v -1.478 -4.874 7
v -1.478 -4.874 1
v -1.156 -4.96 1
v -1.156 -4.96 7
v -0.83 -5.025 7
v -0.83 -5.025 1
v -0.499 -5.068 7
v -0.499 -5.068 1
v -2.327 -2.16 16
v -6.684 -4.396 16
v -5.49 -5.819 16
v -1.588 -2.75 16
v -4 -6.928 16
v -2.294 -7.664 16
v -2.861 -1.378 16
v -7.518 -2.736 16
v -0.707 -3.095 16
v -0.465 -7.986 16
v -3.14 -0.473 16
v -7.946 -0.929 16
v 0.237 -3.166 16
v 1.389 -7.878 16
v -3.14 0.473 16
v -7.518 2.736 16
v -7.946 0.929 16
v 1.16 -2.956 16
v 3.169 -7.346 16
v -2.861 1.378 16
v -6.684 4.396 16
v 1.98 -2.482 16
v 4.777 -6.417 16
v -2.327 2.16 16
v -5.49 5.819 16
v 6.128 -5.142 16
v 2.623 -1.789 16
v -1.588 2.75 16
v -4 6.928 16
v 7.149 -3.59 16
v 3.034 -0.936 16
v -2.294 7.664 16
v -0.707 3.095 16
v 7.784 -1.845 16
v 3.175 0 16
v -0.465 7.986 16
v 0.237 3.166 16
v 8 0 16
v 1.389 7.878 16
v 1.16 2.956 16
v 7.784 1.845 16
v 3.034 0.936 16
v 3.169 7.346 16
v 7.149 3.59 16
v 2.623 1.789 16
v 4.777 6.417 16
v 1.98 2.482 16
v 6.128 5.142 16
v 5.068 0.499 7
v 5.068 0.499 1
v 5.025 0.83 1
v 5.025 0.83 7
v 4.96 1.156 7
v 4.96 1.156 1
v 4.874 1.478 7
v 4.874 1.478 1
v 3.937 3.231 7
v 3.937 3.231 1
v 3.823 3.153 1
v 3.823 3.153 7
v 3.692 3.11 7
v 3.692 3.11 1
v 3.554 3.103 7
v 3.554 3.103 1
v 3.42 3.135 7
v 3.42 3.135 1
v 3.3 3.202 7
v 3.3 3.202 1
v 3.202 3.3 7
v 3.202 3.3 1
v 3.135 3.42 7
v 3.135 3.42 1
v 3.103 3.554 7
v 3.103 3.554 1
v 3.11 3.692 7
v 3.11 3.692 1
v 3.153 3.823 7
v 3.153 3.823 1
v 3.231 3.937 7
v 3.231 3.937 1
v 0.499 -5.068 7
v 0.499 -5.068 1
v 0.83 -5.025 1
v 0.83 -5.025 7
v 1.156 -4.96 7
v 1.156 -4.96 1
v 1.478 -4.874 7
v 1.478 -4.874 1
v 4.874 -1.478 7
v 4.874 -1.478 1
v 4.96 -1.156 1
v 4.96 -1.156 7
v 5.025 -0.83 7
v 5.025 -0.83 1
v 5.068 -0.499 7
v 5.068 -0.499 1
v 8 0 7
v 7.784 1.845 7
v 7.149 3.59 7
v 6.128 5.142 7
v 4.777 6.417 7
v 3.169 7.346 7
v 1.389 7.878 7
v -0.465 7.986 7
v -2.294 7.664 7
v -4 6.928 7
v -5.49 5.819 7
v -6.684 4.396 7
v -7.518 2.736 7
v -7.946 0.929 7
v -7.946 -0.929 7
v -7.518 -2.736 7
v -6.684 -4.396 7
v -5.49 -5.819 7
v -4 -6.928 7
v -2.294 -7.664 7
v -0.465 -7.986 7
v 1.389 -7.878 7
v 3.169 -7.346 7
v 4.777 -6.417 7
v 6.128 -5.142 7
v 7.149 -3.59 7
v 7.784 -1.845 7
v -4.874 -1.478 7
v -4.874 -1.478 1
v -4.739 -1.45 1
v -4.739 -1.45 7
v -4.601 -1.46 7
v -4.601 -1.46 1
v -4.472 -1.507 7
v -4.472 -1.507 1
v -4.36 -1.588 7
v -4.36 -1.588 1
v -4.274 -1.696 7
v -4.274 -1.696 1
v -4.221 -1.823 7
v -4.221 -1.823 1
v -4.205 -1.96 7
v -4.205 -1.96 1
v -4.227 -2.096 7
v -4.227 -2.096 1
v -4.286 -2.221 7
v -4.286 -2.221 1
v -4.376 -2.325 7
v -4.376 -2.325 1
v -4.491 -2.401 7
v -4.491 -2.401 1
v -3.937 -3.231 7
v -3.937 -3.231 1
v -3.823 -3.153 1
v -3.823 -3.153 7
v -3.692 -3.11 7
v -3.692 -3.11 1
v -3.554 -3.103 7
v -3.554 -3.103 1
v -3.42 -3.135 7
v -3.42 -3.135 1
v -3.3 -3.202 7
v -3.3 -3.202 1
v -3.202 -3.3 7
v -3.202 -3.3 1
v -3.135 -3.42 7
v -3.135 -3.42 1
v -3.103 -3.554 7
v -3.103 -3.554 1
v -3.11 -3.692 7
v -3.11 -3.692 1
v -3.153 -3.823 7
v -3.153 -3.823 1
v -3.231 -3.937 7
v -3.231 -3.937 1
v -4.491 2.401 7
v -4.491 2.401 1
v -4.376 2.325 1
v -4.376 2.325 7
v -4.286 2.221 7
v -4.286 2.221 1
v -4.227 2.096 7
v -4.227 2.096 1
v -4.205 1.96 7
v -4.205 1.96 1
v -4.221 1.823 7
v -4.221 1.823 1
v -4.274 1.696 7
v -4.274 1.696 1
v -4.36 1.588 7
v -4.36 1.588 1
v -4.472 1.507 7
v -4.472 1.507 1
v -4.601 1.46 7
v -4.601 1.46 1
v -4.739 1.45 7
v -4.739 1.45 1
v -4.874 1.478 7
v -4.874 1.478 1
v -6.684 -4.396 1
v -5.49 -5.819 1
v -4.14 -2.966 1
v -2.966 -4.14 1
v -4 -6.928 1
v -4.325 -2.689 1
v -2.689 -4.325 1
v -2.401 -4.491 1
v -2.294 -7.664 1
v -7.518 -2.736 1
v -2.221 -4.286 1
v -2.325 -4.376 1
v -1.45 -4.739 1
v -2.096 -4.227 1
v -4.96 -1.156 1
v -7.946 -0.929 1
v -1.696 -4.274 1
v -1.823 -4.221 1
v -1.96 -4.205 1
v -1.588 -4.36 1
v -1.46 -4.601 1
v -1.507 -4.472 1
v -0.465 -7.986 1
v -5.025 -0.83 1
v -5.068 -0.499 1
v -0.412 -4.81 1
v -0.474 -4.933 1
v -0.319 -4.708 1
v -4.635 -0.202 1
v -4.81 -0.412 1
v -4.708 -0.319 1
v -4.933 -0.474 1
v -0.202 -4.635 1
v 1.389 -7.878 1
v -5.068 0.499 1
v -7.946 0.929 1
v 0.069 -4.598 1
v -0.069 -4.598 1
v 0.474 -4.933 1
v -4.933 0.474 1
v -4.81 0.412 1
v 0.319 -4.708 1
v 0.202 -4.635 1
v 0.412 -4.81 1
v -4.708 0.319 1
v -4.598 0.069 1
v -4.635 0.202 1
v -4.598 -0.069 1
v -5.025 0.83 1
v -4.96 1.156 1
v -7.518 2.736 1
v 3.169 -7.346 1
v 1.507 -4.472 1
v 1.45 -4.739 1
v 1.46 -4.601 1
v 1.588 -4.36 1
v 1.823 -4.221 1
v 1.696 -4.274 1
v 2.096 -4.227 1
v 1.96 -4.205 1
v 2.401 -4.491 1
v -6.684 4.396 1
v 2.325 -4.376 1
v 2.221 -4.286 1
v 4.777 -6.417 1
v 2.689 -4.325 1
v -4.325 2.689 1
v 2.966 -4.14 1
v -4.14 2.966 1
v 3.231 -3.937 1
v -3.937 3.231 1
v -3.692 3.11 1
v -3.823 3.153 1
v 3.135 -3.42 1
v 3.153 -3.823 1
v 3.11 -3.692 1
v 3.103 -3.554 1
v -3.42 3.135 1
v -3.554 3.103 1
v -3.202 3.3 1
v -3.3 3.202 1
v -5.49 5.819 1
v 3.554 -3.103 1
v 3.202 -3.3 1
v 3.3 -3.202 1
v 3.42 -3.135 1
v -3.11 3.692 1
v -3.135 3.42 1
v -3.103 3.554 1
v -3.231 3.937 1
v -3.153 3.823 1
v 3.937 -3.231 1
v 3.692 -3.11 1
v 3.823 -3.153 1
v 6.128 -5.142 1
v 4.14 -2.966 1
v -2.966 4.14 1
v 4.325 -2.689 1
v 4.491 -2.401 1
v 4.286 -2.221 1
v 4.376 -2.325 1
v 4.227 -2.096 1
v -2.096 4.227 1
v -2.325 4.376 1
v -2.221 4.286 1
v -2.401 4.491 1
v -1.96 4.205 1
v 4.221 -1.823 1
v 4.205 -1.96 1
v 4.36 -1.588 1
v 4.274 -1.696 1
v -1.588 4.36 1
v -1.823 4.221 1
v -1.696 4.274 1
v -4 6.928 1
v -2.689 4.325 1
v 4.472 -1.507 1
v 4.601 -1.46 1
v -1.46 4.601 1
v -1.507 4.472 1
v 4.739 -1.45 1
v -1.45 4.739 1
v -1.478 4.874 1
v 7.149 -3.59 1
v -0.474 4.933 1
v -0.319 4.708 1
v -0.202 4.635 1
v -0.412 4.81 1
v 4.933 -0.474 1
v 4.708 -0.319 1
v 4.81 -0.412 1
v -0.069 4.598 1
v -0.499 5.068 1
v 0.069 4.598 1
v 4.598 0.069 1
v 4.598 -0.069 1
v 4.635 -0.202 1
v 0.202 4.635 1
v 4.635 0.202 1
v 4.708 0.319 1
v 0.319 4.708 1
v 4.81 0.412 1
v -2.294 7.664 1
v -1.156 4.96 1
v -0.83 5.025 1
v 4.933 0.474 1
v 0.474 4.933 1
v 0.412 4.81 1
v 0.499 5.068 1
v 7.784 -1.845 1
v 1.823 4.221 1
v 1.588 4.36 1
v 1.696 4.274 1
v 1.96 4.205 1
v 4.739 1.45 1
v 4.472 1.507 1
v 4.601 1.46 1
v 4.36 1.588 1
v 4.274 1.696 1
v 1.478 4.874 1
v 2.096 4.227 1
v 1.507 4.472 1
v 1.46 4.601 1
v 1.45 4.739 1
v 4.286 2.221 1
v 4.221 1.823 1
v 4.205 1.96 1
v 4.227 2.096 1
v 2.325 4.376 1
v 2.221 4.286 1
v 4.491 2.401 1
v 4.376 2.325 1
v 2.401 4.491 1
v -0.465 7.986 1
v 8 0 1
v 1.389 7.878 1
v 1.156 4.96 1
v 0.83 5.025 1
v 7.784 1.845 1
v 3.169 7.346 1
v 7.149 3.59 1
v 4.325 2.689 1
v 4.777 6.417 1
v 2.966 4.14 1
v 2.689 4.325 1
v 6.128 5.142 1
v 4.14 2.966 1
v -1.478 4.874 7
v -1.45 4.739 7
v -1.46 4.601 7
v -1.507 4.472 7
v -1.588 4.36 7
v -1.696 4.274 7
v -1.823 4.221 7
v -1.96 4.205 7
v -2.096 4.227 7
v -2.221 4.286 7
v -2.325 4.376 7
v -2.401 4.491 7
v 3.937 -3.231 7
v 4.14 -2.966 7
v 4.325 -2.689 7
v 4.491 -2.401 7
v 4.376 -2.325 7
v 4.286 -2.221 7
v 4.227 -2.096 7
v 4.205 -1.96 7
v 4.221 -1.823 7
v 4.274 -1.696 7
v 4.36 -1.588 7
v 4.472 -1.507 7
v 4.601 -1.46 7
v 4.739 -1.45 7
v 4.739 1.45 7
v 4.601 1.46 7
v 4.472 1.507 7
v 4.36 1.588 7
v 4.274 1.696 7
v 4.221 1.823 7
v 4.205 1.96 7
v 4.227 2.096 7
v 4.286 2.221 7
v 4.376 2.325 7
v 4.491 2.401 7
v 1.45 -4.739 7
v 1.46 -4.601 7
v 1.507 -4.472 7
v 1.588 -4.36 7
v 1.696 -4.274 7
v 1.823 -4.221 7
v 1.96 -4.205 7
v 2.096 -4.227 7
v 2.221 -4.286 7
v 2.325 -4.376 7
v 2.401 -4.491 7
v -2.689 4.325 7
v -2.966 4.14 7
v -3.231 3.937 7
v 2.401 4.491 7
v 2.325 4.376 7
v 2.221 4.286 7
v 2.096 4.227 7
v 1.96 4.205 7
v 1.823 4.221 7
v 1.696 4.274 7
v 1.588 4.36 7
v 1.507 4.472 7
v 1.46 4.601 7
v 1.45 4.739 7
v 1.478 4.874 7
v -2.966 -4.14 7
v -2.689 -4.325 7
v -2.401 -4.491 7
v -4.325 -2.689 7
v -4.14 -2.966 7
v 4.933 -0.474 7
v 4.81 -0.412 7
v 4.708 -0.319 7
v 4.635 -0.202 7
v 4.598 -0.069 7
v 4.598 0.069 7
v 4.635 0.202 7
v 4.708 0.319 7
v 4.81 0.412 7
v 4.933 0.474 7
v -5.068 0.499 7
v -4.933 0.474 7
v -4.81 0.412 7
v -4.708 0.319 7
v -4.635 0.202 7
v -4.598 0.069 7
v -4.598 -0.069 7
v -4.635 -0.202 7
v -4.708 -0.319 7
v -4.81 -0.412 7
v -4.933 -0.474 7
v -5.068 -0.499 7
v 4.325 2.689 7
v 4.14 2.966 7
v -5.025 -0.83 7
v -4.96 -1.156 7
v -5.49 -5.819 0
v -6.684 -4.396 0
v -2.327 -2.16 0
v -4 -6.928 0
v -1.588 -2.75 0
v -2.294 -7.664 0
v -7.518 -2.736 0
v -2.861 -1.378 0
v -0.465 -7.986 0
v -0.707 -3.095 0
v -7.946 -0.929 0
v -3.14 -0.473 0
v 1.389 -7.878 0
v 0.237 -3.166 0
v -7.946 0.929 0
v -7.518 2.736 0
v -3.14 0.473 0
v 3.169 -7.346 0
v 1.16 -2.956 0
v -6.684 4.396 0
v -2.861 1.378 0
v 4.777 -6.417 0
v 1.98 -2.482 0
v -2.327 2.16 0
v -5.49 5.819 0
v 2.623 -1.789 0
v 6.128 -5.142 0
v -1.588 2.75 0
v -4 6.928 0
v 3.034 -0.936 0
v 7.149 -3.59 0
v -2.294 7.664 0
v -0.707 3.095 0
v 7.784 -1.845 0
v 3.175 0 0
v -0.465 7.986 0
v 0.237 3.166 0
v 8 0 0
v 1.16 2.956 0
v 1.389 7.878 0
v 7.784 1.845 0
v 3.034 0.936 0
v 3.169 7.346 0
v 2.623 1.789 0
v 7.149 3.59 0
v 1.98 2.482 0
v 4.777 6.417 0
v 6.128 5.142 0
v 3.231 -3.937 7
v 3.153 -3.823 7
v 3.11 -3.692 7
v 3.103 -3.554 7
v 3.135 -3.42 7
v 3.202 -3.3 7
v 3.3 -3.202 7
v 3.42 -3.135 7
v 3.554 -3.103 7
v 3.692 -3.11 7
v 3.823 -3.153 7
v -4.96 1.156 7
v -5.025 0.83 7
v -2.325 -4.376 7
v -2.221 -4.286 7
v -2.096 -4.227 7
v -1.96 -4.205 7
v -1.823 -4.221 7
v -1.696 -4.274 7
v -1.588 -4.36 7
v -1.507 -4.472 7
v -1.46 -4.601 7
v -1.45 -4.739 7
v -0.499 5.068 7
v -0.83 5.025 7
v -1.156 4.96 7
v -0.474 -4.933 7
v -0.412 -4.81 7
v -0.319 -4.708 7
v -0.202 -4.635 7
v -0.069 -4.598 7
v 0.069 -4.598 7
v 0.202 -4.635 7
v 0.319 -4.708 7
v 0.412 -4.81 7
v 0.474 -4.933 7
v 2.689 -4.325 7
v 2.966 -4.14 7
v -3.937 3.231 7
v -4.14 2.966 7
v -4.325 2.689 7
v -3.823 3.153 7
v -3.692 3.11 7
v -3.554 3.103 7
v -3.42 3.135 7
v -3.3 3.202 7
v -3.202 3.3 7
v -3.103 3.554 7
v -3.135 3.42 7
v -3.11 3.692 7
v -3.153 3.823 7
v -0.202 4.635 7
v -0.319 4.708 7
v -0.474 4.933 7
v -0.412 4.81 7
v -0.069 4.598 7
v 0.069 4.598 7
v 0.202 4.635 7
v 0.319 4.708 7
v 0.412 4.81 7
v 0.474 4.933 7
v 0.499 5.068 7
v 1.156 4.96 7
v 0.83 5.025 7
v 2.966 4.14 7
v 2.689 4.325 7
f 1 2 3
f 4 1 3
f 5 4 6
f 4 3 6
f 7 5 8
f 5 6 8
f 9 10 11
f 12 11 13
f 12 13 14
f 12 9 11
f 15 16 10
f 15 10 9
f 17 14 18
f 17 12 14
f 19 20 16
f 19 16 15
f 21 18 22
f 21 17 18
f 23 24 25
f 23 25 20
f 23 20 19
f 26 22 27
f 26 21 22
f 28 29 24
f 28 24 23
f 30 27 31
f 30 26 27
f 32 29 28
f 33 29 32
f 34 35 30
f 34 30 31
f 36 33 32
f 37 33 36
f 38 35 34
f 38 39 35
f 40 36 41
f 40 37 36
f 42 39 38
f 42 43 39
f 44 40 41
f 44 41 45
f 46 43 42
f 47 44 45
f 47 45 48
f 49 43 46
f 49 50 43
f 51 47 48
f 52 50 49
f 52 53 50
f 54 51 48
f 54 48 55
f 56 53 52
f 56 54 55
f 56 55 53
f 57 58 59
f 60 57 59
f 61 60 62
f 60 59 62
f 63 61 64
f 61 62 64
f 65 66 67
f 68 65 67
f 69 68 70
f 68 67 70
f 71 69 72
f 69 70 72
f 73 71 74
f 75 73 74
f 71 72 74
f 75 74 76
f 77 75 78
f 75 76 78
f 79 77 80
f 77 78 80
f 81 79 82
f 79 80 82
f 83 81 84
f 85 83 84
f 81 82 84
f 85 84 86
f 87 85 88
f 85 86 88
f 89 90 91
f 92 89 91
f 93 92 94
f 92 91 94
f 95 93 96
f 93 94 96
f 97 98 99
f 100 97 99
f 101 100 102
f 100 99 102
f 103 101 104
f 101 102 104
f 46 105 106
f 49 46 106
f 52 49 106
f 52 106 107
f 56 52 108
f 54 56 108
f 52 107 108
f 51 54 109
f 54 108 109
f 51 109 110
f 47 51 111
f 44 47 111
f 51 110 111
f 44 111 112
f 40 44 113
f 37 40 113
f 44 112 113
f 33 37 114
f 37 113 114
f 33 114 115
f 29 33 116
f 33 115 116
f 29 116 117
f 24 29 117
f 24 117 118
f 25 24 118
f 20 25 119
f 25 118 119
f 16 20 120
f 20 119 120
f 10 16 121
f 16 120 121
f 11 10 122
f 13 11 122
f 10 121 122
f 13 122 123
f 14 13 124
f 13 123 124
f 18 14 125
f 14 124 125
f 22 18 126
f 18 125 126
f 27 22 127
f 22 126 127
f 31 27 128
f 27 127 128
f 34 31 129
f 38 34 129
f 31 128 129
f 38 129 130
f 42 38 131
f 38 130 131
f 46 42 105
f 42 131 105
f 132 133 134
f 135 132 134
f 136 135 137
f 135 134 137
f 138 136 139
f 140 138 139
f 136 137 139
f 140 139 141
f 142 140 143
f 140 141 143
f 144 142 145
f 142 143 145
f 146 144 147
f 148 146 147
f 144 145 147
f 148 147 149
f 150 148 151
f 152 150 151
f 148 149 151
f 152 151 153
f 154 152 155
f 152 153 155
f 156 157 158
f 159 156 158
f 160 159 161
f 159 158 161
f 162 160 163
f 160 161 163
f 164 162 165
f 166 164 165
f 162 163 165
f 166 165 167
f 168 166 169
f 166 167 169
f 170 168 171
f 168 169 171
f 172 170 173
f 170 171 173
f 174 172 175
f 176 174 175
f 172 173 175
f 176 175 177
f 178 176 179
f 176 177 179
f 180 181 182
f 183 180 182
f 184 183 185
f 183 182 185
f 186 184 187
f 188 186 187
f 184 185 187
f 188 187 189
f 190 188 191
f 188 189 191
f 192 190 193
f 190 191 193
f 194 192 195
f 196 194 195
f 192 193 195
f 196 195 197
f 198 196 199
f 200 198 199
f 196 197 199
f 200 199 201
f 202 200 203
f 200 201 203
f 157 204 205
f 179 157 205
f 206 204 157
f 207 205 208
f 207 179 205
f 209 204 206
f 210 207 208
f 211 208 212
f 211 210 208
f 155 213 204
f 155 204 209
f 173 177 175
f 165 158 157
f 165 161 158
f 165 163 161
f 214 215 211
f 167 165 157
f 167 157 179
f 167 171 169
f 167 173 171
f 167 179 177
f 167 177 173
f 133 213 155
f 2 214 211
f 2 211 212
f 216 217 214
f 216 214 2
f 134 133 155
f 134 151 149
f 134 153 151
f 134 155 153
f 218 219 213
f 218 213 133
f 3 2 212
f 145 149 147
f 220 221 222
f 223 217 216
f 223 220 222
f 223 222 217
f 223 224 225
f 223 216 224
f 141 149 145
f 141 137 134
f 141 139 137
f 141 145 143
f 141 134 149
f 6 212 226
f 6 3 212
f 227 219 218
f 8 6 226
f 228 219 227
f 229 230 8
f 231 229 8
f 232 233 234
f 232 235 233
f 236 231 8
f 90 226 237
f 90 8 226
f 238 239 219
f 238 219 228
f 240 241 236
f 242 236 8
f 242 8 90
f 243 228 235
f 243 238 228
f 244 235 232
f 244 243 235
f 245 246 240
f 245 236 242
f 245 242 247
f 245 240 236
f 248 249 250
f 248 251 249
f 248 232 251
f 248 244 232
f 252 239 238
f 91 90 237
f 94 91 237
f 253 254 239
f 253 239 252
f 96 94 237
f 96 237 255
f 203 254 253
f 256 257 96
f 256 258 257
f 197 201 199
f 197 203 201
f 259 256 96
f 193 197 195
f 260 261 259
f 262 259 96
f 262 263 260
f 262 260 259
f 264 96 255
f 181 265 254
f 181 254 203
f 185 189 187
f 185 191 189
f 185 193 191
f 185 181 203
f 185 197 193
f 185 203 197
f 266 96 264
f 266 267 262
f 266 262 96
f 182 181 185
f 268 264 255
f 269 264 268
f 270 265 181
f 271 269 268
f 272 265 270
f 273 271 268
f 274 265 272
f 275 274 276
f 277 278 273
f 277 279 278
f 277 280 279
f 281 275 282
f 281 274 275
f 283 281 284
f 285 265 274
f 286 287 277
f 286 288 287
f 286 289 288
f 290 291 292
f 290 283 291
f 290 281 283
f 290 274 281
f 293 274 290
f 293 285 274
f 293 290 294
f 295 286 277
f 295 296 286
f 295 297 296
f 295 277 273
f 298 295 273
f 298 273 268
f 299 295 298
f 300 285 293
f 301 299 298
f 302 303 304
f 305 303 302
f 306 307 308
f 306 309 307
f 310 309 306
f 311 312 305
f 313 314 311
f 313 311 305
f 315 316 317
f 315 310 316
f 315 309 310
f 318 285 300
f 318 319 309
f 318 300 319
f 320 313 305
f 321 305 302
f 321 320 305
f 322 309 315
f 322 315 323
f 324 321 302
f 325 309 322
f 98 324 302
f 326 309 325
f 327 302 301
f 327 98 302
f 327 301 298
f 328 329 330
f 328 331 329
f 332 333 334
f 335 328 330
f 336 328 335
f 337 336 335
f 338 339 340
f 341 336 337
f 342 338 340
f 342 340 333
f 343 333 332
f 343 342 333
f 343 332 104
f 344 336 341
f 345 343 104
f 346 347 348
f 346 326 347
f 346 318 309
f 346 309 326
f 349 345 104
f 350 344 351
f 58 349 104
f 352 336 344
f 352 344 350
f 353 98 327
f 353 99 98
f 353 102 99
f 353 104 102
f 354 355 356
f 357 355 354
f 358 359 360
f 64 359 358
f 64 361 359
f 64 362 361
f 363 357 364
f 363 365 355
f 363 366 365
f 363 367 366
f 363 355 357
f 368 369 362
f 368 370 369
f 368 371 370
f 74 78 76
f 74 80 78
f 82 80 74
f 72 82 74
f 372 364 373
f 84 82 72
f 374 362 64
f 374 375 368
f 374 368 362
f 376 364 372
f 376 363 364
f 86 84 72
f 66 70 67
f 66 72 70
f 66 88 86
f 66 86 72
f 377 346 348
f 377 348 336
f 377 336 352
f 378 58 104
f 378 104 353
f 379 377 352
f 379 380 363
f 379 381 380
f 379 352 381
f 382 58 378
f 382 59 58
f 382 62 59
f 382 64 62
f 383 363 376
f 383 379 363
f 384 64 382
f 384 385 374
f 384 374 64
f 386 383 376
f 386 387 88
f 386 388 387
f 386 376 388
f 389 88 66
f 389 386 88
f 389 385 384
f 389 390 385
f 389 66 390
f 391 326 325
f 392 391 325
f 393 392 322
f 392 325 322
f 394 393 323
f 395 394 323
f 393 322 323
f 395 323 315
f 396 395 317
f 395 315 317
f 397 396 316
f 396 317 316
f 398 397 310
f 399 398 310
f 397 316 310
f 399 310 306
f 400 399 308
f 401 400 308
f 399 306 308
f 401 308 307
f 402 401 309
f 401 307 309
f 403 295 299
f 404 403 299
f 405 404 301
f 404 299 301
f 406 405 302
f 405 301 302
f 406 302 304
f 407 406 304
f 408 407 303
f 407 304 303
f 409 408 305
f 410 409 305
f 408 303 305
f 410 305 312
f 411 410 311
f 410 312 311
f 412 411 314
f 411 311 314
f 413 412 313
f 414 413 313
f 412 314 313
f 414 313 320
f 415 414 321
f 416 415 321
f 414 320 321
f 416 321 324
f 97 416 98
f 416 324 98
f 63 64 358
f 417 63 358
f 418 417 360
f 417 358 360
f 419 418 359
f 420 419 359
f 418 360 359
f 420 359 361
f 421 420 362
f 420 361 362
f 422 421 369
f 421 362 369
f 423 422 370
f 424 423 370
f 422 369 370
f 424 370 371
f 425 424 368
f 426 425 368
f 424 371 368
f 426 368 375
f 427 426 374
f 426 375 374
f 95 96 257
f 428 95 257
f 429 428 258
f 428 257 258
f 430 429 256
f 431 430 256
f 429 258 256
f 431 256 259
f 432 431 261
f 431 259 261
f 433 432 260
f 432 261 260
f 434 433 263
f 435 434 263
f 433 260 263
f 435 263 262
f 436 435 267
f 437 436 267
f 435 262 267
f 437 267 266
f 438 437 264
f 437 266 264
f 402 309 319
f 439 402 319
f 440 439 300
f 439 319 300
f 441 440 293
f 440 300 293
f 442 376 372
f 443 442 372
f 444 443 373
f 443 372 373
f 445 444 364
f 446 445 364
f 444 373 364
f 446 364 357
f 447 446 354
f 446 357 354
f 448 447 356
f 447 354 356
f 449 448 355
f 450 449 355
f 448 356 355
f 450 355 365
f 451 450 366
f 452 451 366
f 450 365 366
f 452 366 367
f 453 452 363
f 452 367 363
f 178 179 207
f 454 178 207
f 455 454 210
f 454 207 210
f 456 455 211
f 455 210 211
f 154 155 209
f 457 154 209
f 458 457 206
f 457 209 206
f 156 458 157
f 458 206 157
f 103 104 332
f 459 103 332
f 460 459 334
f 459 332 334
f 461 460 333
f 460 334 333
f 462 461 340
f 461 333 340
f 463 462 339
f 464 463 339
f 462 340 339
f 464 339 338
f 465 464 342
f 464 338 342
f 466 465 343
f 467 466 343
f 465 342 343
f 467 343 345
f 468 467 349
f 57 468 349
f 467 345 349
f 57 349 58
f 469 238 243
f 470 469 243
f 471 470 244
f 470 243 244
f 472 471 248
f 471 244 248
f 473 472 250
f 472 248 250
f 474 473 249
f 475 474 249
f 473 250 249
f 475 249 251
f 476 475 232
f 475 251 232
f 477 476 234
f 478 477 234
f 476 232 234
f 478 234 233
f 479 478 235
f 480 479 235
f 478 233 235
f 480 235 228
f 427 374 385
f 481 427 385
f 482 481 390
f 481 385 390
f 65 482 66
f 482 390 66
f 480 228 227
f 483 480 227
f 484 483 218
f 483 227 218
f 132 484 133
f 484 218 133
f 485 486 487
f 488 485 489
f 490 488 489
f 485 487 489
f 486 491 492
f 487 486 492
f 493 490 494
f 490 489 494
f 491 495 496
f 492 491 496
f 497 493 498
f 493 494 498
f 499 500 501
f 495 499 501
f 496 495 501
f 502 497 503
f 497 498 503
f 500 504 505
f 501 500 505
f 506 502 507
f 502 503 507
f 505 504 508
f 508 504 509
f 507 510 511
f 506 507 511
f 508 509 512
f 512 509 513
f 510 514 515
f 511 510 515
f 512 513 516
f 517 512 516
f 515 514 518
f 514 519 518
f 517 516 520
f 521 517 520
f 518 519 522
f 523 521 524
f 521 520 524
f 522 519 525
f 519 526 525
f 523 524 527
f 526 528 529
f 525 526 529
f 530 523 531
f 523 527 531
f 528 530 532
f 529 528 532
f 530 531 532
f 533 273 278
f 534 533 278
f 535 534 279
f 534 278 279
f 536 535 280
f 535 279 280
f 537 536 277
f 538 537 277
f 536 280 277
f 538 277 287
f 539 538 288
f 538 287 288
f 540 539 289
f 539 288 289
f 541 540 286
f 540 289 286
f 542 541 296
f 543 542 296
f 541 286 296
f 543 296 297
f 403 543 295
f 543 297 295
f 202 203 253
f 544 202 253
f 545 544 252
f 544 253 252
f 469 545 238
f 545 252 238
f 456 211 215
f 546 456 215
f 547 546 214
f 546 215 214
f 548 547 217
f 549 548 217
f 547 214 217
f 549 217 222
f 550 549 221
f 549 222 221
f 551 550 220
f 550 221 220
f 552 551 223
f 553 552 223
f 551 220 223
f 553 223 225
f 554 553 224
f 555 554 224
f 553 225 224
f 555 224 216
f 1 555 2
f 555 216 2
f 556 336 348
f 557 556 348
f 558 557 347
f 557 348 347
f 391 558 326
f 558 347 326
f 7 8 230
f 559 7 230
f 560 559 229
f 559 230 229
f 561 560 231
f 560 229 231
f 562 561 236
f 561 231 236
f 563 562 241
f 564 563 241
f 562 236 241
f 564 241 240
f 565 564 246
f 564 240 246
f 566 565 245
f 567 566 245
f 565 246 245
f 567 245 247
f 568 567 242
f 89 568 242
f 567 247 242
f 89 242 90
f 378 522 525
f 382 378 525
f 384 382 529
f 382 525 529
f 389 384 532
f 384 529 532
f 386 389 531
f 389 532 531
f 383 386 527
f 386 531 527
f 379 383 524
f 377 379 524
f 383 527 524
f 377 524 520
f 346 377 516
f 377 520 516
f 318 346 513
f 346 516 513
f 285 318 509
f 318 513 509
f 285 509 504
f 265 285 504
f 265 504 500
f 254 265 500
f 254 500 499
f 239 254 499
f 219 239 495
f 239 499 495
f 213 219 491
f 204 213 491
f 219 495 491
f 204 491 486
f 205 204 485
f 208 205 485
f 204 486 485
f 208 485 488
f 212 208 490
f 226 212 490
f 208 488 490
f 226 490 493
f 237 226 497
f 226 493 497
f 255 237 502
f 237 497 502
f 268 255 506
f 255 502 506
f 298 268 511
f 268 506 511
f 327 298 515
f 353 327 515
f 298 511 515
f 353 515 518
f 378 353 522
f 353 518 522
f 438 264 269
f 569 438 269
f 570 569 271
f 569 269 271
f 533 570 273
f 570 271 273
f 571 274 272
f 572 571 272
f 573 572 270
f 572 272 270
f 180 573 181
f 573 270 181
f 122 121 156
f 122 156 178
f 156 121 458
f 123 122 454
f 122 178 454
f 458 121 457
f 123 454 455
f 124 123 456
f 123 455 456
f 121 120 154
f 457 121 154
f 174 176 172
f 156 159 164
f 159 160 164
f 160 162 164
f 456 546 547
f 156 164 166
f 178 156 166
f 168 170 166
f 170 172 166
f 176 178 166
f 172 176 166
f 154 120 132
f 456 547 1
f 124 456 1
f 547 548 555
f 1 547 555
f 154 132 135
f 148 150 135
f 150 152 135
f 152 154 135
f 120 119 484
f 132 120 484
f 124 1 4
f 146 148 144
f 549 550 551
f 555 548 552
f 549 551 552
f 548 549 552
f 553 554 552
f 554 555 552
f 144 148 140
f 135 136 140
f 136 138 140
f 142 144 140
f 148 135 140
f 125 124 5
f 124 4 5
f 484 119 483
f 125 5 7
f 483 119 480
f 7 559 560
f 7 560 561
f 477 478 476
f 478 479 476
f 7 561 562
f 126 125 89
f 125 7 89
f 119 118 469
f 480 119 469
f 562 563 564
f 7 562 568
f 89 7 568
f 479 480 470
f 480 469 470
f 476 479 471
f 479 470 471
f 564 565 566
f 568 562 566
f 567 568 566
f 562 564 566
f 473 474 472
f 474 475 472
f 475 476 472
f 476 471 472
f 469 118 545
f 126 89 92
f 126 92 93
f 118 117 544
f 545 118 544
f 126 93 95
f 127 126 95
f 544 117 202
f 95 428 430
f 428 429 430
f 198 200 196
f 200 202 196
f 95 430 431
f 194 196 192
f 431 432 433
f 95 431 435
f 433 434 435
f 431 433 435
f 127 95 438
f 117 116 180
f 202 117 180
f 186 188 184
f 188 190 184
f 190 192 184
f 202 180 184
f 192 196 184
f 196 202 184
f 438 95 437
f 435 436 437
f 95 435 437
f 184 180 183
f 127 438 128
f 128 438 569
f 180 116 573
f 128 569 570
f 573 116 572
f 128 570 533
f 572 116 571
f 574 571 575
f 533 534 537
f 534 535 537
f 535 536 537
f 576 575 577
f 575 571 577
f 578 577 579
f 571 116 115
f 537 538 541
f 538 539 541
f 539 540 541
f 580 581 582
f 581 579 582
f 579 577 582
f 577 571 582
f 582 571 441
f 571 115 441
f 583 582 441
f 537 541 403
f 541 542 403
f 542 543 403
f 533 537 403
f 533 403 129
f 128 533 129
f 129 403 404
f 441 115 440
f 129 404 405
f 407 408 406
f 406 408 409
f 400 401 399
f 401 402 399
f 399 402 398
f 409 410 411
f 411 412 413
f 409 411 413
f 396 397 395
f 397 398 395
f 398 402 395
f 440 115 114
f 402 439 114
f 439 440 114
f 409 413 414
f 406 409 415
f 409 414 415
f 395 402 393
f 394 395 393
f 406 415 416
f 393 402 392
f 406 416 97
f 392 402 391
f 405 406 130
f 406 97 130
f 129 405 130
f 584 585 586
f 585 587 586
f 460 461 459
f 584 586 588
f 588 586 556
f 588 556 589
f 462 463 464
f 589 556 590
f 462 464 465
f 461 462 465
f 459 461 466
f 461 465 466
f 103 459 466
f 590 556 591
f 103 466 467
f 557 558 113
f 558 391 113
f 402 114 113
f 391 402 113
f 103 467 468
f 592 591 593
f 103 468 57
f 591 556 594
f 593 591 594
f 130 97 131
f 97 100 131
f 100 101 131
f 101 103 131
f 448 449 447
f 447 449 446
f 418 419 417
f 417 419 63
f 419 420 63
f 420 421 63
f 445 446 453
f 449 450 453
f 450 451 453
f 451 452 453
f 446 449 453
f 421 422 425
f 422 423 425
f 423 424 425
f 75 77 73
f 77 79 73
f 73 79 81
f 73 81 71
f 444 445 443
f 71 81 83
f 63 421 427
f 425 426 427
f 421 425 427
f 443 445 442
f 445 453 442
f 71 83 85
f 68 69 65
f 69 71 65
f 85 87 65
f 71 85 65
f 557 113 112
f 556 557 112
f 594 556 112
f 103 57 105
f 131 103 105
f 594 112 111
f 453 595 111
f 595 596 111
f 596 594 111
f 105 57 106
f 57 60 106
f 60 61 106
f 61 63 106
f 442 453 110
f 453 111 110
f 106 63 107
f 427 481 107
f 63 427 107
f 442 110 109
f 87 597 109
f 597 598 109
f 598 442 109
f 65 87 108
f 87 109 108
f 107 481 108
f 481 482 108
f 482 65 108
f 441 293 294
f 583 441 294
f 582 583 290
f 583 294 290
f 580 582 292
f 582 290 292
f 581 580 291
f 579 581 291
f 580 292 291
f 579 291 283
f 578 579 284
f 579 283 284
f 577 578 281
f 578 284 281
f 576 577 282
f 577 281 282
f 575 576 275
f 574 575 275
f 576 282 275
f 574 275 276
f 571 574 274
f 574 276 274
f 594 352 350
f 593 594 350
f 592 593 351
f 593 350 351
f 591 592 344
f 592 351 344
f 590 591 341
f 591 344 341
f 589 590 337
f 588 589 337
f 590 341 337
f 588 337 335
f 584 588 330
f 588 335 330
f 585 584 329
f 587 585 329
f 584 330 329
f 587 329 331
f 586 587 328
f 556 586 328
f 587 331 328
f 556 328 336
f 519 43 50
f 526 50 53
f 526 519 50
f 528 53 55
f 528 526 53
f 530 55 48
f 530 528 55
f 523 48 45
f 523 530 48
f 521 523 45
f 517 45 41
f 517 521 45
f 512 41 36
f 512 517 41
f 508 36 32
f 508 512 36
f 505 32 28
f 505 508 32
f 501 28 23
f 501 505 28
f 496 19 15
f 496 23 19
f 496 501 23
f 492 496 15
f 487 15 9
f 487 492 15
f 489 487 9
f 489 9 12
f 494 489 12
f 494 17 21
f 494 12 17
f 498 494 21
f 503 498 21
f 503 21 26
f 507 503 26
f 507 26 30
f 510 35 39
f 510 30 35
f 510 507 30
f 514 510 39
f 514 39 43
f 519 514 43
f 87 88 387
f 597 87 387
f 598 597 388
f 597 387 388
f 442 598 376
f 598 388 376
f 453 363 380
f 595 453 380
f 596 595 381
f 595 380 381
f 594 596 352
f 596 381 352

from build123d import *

# Parameters (mm, degrees)
SKETCH1_R           = 8
BOSS_EXTRUDE1_DEPTH = 1
BOSS_EXTRUDE2_DEPTH = 6
SKETCH3_R           = 8
BOSS_EXTRUDE3_DEPTH = 9
SKETCH1_3_R         = 3.175
CUT_EXTRUDE1_DEPTH  = 20.595917942


with BuildPart() as part:
    # Sketch1 → Boss-Extrude1 (new body)
    with BuildSketch(Plane.XY):
        Circle(SKETCH1_R)
    extrude(amount=BOSS_EXTRUDE1_DEPTH)

    # Sketch2 → Boss-Extrude2 (add)
    with BuildSketch(Plane.XY.offset(1)):
        with BuildLine():
            ThreePointArc((-0.499397244, 5.068414486), (-0.993586851, 4.995098416), (-1.47821536, 4.873715458))
            ThreePointArc((-1.47821536, 4.873715458), (-1.757649001, 4.243340055), (-2.400981144, 4.491493355))
            ThreePointArc((-2.400981144, 4.491493355), (-2.829495962, 4.234639963), (-3.230783076, 3.937037431))
            ThreePointArc((-3.230783076, 3.937037431), (-3.247711874, 3.247711874), (-3.937037431, 3.230783076))
            ThreePointArc((-3.937037431, 3.230783076), (-4.234639963, 2.829495962), (-4.491493355, 2.400981144))
            ThreePointArc((-4.491493355, 2.400981144), (-4.243340055, 1.757649001), (-4.873715458, 1.47821536))
            ThreePointArc((-4.873715458, 1.47821536), (-4.995098416, 0.993586851), (-5.068414486, 0.499397244))
            ThreePointArc((-5.068414486, 0.499397244), (-4.592958179, 0), (-5.068414486, -0.499397244))
            ThreePointArc((-5.068414486, -0.499397244), (-4.995098416, -0.993586851), (-4.873715458, -1.47821536))
            ThreePointArc((-4.873715458, -1.47821536), (-4.243340055, -1.757649001), (-4.491493355, -2.400981144))
            ThreePointArc((-4.491493355, -2.400981144), (-4.234639963, -2.829495962), (-3.937037431, -3.230783076))
            ThreePointArc((-3.937037431, -3.230783076), (-3.247711874, -3.247711874), (-3.230783076, -3.937037431))
            ThreePointArc((-3.230783076, -3.937037431), (-2.829495962, -4.234639963), (-2.400981144, -4.491493355))
            ThreePointArc((-2.400981144, -4.491493355), (-1.757649001, -4.243340055), (-1.47821536, -4.873715458))
            ThreePointArc((-1.47821536, -4.873715458), (-0.993586851, -4.995098416), (-0.499397244, -5.068414486))
            ThreePointArc((-0.499397244, -5.068414486), (0, -4.592958179), (0.499397244, -5.068414486))
            ThreePointArc((0.499397244, -5.068414486), (0.993586851, -4.995098416), (1.47821536, -4.873715458))
            ThreePointArc((1.47821536, -4.873715458), (1.757649001, -4.243340055), (2.400981144, -4.491493355))
            ThreePointArc((2.400981144, -4.491493355), (2.829495962, -4.234639963), (3.230783076, -3.937037431))
            ThreePointArc((3.230783076, -3.937037431), (3.247711874, -3.247711874), (3.937037431, -3.230783076))
            ThreePointArc((3.937037431, -3.230783076), (4.234639963, -2.829495962), (4.491493355, -2.400981144))
            ThreePointArc((4.491493355, -2.400981144), (4.243340055, -1.757649001), (4.873715458, -1.47821536))
            ThreePointArc((4.873715458, -1.47821536), (4.995098416, -0.993586851), (5.068414486, -0.499397244))
            ThreePointArc((5.068414486, -0.499397244), (4.592958179, 0), (5.068414486, 0.499397244))
            ThreePointArc((5.068414486, 0.499397244), (4.995098416, 0.993586851), (4.873715458, 1.47821536))
            ThreePointArc((4.873715458, 1.47821536), (4.243340055, 1.757649001), (4.491493355, 2.400981144))
            ThreePointArc((4.491493355, 2.400981144), (4.234639963, 2.829495962), (3.937037431, 3.230783076))
            ThreePointArc((3.937037431, 3.230783076), (3.247711874, 3.247711874), (3.230783076, 3.937037431))
            ThreePointArc((3.230783076, 3.937037431), (2.829495962, 4.234639963), (2.400981144, 4.491493355))
            ThreePointArc((2.400981144, 4.491493355), (1.757649001, 4.243340055), (1.47821536, 4.873715458))
            ThreePointArc((1.47821536, 4.873715458), (0.993586851, 4.995098416), (0.499397244, 5.068414486))
            ThreePointArc((0.499397244, 5.068414486), (0, 4.592958179), (-0.499397244, 5.068414486))
        make_face()
    extrude(amount=BOSS_EXTRUDE2_DEPTH)

    # Sketch3 → Boss-Extrude3 (add)
    with BuildSketch(Plane.XY.offset(7)):
        Circle(SKETCH3_R)
    extrude(amount=BOSS_EXTRUDE3_DEPTH)

    # Sketch1<3> → Cut-Extrude1 (cut, through all)
    with BuildSketch(Plane.XY):
        Circle(SKETCH1_3_R)
    extrude(amount=CUT_EXTRUDE1_DEPTH, mode=Mode.SUBTRACT)


solid = part.part
